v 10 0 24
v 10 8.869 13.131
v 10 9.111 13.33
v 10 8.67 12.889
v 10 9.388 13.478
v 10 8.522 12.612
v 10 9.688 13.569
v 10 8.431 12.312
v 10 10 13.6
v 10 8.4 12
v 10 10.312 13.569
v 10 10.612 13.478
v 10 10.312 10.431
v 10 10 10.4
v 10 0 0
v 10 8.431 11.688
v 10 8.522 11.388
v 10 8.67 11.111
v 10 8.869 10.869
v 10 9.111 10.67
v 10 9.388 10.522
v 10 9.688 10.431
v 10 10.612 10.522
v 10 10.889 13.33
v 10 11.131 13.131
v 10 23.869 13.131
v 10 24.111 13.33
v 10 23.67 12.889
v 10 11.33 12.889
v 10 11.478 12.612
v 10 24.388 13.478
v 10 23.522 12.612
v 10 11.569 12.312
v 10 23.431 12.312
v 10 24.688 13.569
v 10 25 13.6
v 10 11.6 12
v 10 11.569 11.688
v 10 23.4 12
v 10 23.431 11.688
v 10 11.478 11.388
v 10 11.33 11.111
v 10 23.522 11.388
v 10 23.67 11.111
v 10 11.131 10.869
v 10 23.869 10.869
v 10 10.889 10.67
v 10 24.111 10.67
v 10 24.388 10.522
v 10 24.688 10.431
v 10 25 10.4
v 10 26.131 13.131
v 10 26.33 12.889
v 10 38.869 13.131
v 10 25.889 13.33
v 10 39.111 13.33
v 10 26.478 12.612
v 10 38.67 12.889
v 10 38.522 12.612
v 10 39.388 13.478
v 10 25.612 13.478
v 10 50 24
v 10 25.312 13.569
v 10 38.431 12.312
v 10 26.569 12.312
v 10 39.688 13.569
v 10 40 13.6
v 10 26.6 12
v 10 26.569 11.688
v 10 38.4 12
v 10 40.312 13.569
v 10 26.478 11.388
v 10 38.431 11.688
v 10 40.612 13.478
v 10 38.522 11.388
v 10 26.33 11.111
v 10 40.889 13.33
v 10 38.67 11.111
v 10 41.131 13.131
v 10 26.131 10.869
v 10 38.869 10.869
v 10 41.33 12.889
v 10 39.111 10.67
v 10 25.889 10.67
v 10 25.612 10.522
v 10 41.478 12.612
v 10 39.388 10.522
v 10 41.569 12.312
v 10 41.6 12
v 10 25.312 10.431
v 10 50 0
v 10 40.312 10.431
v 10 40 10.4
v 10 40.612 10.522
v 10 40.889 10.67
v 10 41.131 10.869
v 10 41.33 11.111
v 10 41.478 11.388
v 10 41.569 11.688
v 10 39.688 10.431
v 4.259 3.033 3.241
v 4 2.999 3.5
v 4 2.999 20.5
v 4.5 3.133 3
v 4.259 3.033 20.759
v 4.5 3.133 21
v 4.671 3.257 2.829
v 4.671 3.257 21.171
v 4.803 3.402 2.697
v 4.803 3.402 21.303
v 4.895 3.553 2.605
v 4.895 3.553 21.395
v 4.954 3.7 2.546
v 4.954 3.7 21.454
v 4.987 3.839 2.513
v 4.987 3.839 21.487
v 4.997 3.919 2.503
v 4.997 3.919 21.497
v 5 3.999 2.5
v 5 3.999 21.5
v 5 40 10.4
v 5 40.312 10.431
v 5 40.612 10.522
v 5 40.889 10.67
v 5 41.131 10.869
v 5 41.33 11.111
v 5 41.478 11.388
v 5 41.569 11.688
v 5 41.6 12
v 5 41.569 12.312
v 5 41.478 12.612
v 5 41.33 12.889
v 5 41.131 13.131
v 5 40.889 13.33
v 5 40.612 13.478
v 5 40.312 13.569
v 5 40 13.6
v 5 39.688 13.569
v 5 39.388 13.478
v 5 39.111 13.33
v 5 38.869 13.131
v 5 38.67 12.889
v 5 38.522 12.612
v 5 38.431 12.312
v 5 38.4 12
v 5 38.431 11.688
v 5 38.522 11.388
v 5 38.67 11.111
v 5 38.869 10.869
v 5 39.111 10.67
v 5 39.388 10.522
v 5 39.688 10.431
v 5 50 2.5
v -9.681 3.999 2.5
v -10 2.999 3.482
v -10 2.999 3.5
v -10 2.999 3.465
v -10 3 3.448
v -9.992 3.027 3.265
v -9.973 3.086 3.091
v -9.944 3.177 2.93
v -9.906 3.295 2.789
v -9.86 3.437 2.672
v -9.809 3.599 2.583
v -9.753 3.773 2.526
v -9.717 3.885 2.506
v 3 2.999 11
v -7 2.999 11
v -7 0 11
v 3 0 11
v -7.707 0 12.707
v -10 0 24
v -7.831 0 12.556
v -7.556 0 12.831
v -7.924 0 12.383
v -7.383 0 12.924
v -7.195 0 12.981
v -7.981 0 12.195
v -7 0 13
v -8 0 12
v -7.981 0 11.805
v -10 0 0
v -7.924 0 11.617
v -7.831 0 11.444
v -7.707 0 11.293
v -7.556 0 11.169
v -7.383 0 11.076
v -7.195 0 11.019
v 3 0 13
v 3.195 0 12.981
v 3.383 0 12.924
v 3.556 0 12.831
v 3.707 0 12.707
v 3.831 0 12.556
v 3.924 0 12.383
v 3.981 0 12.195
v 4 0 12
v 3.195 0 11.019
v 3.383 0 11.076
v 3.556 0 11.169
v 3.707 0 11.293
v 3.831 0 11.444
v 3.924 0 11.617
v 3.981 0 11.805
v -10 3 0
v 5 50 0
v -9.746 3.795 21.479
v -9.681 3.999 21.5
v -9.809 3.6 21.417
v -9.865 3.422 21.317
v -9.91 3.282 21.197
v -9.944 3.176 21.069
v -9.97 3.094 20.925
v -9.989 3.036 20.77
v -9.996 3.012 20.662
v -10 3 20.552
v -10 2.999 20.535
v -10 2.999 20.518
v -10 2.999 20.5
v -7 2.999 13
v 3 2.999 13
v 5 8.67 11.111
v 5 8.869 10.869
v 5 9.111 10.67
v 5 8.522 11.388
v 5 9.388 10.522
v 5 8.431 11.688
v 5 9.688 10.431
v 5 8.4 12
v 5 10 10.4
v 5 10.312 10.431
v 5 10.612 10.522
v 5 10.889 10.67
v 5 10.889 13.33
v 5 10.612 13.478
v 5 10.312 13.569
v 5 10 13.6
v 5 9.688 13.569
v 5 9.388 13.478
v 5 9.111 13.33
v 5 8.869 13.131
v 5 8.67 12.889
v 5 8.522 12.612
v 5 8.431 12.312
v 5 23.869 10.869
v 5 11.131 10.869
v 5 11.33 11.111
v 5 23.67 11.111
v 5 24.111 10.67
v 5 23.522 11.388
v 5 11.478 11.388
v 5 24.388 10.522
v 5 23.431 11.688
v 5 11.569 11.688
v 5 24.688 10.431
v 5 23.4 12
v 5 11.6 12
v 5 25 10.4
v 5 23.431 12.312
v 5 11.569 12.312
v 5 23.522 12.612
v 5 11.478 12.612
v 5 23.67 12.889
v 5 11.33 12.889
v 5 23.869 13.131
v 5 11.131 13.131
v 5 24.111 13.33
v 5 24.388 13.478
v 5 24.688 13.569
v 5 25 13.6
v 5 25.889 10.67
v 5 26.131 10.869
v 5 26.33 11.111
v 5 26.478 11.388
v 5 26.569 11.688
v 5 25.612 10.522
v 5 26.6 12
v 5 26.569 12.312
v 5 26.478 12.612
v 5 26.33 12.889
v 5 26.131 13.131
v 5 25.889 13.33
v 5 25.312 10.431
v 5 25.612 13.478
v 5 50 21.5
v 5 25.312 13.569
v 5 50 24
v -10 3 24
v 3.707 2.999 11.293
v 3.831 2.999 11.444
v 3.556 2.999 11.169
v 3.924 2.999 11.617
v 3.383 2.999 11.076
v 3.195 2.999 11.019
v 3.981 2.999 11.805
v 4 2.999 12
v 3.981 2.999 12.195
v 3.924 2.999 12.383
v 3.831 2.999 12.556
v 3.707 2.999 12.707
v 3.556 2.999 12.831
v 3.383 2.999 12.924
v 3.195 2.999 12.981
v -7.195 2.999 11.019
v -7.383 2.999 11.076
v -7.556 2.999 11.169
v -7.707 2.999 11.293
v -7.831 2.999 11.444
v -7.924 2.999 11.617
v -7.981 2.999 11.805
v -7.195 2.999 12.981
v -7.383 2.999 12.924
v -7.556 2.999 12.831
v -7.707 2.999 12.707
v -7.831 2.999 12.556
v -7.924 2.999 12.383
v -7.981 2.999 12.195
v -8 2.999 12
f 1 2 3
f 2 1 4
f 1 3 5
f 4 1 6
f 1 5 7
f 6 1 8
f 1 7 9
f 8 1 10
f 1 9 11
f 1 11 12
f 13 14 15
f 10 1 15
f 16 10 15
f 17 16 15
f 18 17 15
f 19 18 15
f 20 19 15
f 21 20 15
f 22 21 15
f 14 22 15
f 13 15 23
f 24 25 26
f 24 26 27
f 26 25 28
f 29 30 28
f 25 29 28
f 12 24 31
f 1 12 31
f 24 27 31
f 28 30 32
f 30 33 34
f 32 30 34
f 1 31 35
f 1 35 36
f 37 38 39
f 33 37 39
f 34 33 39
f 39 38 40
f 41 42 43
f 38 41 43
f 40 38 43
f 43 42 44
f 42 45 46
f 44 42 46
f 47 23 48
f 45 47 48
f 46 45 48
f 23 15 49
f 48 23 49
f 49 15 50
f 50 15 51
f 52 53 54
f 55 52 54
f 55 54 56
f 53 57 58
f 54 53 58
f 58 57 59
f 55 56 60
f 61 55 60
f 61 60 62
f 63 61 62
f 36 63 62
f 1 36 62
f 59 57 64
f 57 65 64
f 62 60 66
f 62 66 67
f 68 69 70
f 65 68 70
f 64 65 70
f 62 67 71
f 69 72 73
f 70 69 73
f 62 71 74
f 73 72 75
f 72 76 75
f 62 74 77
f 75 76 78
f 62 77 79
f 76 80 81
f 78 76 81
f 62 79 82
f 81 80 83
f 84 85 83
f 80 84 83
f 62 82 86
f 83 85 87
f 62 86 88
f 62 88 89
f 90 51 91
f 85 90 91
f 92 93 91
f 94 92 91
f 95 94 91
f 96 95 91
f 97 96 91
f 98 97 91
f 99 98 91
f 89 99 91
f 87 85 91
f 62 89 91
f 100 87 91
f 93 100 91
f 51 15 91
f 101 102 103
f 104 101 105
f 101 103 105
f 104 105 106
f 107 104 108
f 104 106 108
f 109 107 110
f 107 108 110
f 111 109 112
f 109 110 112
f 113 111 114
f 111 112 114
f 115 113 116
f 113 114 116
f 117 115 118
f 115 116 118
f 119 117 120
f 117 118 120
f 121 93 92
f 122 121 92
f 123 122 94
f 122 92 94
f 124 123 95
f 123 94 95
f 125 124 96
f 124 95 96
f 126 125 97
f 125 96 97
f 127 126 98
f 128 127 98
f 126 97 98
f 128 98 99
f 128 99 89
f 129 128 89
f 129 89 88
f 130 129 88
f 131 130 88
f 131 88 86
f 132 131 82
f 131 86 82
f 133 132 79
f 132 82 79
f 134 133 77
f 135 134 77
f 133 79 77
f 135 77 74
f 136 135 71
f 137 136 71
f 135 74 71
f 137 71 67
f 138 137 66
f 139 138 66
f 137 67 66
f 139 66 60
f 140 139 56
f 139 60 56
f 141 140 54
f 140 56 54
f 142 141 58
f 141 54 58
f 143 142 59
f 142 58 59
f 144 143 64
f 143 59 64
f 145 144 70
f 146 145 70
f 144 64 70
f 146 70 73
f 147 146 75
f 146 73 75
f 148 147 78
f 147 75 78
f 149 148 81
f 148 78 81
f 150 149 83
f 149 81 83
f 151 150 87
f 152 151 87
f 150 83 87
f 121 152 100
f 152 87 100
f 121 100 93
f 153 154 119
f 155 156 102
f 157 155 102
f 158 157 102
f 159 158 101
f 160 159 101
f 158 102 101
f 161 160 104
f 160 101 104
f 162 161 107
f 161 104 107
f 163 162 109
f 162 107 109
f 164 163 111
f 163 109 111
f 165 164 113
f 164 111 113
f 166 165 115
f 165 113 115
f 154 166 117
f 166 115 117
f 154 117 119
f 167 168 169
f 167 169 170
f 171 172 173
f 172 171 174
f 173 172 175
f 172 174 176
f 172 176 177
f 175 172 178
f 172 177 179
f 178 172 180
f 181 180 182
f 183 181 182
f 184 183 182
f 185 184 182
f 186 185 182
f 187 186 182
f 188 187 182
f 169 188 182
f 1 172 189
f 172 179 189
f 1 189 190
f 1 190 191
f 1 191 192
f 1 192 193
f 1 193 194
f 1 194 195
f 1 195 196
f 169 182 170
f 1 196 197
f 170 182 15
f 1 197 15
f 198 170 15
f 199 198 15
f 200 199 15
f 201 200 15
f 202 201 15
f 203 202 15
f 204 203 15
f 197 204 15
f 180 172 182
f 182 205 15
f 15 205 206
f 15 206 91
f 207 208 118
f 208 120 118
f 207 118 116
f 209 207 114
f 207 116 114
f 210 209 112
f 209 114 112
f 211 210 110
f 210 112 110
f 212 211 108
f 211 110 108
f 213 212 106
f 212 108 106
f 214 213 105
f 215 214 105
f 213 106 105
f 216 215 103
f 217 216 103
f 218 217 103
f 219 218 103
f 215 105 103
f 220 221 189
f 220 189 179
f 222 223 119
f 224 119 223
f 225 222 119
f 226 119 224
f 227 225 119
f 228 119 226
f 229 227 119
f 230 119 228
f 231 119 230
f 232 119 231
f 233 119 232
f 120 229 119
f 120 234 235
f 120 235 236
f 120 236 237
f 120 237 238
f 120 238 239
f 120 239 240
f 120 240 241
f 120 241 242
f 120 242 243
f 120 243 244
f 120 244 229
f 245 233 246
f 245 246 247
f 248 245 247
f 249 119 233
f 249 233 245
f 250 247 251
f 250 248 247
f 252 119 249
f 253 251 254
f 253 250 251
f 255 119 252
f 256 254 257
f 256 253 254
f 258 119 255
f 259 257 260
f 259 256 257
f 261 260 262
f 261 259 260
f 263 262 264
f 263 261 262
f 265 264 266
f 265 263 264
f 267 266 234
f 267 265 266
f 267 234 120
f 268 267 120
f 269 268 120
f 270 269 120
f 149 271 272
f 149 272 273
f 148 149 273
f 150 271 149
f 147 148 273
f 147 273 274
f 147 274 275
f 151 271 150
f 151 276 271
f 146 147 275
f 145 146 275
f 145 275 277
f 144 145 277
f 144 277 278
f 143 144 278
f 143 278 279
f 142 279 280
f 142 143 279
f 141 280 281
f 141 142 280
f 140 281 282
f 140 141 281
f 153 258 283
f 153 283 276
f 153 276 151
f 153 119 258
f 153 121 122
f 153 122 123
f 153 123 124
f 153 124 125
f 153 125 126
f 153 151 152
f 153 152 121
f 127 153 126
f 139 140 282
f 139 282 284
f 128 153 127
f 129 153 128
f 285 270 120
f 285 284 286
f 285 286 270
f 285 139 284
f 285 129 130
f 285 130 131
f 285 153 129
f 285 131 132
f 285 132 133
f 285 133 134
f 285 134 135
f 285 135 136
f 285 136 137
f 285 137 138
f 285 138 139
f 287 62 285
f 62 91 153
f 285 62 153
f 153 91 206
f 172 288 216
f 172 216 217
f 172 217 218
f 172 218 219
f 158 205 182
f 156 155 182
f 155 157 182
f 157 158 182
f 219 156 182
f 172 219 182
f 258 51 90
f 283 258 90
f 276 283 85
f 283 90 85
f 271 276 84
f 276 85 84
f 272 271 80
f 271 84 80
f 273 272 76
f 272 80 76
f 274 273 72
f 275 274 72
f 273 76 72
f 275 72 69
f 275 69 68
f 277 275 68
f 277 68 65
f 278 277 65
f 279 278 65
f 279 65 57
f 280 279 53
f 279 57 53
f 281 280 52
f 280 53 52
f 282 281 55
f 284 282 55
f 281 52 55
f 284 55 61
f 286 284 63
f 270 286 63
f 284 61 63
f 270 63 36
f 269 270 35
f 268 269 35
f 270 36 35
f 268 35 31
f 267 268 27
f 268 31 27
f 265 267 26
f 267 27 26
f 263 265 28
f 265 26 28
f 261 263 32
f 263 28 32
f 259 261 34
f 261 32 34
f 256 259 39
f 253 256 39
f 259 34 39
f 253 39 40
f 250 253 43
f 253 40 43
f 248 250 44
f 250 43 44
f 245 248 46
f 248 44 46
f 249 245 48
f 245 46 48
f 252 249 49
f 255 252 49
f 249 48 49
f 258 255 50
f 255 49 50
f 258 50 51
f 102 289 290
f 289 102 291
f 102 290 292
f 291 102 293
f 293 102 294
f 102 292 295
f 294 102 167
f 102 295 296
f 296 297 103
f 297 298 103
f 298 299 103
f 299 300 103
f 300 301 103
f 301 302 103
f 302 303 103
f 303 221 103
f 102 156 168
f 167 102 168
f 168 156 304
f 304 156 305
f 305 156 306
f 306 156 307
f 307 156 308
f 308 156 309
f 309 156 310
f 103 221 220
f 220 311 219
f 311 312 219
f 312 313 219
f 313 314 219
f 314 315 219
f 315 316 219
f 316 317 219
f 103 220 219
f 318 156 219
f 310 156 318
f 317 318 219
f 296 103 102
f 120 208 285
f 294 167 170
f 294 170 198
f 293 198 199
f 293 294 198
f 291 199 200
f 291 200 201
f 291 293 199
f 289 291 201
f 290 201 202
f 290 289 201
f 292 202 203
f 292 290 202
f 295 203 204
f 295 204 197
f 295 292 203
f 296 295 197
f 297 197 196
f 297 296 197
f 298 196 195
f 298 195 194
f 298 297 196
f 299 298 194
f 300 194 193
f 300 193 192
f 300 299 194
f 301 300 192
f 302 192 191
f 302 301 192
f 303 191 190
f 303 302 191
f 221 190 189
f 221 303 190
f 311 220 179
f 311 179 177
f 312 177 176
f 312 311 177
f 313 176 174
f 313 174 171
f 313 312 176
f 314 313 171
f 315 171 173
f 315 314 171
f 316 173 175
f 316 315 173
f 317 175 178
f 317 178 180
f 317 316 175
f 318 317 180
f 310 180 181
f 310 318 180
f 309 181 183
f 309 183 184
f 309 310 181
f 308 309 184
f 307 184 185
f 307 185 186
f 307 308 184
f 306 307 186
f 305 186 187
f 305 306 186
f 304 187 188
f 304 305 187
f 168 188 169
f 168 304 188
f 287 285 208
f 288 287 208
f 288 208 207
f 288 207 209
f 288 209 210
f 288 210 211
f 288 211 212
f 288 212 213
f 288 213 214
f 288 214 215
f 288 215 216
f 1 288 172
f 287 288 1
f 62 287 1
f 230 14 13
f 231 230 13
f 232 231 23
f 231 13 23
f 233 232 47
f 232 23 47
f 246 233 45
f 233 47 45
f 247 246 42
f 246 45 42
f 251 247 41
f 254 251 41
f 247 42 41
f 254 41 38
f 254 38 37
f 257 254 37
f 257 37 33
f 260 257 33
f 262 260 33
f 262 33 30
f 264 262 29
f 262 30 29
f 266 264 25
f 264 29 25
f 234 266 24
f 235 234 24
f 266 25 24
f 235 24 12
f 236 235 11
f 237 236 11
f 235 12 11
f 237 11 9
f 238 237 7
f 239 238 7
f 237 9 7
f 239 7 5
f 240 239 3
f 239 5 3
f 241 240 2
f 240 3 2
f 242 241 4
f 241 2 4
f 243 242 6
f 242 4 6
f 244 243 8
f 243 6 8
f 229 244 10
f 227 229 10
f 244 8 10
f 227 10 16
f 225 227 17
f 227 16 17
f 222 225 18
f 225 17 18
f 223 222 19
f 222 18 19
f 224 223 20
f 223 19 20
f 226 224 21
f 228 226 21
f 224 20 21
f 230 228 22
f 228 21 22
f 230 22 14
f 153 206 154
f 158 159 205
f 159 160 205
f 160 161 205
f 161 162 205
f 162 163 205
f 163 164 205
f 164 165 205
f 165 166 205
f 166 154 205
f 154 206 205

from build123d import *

# Parameters (mm, degrees)
BOSS_EXTRUDE1_DEPTH = 24
SKETCH4_W           = 19
SKETCH4_H           = 47.001372255
CUT_EXTRUDE2_DEPTH  = 15
SKETCH6_R           = 1.6
CUT_EXTRUDE4_DEPTH  = 5
CUT_EXTRUDE5_DEPTH  = 2.998627745
FILLET1_R           = 1


with BuildPart() as part:
    # Sketch1 → Boss-Extrude1 (new body)
    with BuildSketch(Plane.XY):
        Polygon((-10, 0), (10, 0), (10, 50), (5, 50), (-10, 3), align=None)
    extrude(amount=BOSS_EXTRUDE1_DEPTH)

    # Sketch4 → Cut-Extrude2 (cut)
    with BuildSketch(Plane.ZY.offset(10)):
        with Locations((12, 26.499313873)):
            Rectangle(SKETCH4_W, SKETCH4_H)
    extrude(amount=-CUT_EXTRUDE2_DEPTH, mode=Mode.SUBTRACT)

    # Sketch6 → Cut-Extrude4 (cut)
    with BuildSketch(Plane(origin=(10, 0, 0), x_dir=(0, 0, -1), z_dir=(1, 0, 0))):
        with Locations((-12, 25)):
            Circle(SKETCH6_R)
        with Locations((-12, 10)):
            Circle(SKETCH6_R)
        with Locations((-12, 40)):
            Circle(SKETCH6_R)
    extrude(amount=-CUT_EXTRUDE4_DEPTH, mode=Mode.SUBTRACT)

    # Sketch7 → Cut-Extrude5 (cut)
    with BuildSketch(Plane(origin=(0, 2.998627745, 0), x_dir=(1, 0, 0), z_dir=(0, 1, 0))):
        with BuildLine():
            Line((-7, -11), (3, -11))
            ThreePointArc((3, -11), (4, -12), (3, -13))
            Line((3, -13), (-7, -13))
            ThreePointArc((-7, -13), (-8, -12), (-7, -11))
        make_face()
    extrude(amount=-CUT_EXTRUDE5_DEPTH, mode=Mode.SUBTRACT)

    # Fillet1
    fillet1_edges = [part.edges().sort_by_distance(p)[0] for p in [
        (5, 2.998627745, 12),
        (-2.5, 2.998627745, 21.5),
        (-2.5, 2.998627745, 2.5),
    ]]
    fillet(fillet1_edges, radius=FILLET1_R - 0.0001)  # a hair under: the kernel refuses the full size


solid = part.part
